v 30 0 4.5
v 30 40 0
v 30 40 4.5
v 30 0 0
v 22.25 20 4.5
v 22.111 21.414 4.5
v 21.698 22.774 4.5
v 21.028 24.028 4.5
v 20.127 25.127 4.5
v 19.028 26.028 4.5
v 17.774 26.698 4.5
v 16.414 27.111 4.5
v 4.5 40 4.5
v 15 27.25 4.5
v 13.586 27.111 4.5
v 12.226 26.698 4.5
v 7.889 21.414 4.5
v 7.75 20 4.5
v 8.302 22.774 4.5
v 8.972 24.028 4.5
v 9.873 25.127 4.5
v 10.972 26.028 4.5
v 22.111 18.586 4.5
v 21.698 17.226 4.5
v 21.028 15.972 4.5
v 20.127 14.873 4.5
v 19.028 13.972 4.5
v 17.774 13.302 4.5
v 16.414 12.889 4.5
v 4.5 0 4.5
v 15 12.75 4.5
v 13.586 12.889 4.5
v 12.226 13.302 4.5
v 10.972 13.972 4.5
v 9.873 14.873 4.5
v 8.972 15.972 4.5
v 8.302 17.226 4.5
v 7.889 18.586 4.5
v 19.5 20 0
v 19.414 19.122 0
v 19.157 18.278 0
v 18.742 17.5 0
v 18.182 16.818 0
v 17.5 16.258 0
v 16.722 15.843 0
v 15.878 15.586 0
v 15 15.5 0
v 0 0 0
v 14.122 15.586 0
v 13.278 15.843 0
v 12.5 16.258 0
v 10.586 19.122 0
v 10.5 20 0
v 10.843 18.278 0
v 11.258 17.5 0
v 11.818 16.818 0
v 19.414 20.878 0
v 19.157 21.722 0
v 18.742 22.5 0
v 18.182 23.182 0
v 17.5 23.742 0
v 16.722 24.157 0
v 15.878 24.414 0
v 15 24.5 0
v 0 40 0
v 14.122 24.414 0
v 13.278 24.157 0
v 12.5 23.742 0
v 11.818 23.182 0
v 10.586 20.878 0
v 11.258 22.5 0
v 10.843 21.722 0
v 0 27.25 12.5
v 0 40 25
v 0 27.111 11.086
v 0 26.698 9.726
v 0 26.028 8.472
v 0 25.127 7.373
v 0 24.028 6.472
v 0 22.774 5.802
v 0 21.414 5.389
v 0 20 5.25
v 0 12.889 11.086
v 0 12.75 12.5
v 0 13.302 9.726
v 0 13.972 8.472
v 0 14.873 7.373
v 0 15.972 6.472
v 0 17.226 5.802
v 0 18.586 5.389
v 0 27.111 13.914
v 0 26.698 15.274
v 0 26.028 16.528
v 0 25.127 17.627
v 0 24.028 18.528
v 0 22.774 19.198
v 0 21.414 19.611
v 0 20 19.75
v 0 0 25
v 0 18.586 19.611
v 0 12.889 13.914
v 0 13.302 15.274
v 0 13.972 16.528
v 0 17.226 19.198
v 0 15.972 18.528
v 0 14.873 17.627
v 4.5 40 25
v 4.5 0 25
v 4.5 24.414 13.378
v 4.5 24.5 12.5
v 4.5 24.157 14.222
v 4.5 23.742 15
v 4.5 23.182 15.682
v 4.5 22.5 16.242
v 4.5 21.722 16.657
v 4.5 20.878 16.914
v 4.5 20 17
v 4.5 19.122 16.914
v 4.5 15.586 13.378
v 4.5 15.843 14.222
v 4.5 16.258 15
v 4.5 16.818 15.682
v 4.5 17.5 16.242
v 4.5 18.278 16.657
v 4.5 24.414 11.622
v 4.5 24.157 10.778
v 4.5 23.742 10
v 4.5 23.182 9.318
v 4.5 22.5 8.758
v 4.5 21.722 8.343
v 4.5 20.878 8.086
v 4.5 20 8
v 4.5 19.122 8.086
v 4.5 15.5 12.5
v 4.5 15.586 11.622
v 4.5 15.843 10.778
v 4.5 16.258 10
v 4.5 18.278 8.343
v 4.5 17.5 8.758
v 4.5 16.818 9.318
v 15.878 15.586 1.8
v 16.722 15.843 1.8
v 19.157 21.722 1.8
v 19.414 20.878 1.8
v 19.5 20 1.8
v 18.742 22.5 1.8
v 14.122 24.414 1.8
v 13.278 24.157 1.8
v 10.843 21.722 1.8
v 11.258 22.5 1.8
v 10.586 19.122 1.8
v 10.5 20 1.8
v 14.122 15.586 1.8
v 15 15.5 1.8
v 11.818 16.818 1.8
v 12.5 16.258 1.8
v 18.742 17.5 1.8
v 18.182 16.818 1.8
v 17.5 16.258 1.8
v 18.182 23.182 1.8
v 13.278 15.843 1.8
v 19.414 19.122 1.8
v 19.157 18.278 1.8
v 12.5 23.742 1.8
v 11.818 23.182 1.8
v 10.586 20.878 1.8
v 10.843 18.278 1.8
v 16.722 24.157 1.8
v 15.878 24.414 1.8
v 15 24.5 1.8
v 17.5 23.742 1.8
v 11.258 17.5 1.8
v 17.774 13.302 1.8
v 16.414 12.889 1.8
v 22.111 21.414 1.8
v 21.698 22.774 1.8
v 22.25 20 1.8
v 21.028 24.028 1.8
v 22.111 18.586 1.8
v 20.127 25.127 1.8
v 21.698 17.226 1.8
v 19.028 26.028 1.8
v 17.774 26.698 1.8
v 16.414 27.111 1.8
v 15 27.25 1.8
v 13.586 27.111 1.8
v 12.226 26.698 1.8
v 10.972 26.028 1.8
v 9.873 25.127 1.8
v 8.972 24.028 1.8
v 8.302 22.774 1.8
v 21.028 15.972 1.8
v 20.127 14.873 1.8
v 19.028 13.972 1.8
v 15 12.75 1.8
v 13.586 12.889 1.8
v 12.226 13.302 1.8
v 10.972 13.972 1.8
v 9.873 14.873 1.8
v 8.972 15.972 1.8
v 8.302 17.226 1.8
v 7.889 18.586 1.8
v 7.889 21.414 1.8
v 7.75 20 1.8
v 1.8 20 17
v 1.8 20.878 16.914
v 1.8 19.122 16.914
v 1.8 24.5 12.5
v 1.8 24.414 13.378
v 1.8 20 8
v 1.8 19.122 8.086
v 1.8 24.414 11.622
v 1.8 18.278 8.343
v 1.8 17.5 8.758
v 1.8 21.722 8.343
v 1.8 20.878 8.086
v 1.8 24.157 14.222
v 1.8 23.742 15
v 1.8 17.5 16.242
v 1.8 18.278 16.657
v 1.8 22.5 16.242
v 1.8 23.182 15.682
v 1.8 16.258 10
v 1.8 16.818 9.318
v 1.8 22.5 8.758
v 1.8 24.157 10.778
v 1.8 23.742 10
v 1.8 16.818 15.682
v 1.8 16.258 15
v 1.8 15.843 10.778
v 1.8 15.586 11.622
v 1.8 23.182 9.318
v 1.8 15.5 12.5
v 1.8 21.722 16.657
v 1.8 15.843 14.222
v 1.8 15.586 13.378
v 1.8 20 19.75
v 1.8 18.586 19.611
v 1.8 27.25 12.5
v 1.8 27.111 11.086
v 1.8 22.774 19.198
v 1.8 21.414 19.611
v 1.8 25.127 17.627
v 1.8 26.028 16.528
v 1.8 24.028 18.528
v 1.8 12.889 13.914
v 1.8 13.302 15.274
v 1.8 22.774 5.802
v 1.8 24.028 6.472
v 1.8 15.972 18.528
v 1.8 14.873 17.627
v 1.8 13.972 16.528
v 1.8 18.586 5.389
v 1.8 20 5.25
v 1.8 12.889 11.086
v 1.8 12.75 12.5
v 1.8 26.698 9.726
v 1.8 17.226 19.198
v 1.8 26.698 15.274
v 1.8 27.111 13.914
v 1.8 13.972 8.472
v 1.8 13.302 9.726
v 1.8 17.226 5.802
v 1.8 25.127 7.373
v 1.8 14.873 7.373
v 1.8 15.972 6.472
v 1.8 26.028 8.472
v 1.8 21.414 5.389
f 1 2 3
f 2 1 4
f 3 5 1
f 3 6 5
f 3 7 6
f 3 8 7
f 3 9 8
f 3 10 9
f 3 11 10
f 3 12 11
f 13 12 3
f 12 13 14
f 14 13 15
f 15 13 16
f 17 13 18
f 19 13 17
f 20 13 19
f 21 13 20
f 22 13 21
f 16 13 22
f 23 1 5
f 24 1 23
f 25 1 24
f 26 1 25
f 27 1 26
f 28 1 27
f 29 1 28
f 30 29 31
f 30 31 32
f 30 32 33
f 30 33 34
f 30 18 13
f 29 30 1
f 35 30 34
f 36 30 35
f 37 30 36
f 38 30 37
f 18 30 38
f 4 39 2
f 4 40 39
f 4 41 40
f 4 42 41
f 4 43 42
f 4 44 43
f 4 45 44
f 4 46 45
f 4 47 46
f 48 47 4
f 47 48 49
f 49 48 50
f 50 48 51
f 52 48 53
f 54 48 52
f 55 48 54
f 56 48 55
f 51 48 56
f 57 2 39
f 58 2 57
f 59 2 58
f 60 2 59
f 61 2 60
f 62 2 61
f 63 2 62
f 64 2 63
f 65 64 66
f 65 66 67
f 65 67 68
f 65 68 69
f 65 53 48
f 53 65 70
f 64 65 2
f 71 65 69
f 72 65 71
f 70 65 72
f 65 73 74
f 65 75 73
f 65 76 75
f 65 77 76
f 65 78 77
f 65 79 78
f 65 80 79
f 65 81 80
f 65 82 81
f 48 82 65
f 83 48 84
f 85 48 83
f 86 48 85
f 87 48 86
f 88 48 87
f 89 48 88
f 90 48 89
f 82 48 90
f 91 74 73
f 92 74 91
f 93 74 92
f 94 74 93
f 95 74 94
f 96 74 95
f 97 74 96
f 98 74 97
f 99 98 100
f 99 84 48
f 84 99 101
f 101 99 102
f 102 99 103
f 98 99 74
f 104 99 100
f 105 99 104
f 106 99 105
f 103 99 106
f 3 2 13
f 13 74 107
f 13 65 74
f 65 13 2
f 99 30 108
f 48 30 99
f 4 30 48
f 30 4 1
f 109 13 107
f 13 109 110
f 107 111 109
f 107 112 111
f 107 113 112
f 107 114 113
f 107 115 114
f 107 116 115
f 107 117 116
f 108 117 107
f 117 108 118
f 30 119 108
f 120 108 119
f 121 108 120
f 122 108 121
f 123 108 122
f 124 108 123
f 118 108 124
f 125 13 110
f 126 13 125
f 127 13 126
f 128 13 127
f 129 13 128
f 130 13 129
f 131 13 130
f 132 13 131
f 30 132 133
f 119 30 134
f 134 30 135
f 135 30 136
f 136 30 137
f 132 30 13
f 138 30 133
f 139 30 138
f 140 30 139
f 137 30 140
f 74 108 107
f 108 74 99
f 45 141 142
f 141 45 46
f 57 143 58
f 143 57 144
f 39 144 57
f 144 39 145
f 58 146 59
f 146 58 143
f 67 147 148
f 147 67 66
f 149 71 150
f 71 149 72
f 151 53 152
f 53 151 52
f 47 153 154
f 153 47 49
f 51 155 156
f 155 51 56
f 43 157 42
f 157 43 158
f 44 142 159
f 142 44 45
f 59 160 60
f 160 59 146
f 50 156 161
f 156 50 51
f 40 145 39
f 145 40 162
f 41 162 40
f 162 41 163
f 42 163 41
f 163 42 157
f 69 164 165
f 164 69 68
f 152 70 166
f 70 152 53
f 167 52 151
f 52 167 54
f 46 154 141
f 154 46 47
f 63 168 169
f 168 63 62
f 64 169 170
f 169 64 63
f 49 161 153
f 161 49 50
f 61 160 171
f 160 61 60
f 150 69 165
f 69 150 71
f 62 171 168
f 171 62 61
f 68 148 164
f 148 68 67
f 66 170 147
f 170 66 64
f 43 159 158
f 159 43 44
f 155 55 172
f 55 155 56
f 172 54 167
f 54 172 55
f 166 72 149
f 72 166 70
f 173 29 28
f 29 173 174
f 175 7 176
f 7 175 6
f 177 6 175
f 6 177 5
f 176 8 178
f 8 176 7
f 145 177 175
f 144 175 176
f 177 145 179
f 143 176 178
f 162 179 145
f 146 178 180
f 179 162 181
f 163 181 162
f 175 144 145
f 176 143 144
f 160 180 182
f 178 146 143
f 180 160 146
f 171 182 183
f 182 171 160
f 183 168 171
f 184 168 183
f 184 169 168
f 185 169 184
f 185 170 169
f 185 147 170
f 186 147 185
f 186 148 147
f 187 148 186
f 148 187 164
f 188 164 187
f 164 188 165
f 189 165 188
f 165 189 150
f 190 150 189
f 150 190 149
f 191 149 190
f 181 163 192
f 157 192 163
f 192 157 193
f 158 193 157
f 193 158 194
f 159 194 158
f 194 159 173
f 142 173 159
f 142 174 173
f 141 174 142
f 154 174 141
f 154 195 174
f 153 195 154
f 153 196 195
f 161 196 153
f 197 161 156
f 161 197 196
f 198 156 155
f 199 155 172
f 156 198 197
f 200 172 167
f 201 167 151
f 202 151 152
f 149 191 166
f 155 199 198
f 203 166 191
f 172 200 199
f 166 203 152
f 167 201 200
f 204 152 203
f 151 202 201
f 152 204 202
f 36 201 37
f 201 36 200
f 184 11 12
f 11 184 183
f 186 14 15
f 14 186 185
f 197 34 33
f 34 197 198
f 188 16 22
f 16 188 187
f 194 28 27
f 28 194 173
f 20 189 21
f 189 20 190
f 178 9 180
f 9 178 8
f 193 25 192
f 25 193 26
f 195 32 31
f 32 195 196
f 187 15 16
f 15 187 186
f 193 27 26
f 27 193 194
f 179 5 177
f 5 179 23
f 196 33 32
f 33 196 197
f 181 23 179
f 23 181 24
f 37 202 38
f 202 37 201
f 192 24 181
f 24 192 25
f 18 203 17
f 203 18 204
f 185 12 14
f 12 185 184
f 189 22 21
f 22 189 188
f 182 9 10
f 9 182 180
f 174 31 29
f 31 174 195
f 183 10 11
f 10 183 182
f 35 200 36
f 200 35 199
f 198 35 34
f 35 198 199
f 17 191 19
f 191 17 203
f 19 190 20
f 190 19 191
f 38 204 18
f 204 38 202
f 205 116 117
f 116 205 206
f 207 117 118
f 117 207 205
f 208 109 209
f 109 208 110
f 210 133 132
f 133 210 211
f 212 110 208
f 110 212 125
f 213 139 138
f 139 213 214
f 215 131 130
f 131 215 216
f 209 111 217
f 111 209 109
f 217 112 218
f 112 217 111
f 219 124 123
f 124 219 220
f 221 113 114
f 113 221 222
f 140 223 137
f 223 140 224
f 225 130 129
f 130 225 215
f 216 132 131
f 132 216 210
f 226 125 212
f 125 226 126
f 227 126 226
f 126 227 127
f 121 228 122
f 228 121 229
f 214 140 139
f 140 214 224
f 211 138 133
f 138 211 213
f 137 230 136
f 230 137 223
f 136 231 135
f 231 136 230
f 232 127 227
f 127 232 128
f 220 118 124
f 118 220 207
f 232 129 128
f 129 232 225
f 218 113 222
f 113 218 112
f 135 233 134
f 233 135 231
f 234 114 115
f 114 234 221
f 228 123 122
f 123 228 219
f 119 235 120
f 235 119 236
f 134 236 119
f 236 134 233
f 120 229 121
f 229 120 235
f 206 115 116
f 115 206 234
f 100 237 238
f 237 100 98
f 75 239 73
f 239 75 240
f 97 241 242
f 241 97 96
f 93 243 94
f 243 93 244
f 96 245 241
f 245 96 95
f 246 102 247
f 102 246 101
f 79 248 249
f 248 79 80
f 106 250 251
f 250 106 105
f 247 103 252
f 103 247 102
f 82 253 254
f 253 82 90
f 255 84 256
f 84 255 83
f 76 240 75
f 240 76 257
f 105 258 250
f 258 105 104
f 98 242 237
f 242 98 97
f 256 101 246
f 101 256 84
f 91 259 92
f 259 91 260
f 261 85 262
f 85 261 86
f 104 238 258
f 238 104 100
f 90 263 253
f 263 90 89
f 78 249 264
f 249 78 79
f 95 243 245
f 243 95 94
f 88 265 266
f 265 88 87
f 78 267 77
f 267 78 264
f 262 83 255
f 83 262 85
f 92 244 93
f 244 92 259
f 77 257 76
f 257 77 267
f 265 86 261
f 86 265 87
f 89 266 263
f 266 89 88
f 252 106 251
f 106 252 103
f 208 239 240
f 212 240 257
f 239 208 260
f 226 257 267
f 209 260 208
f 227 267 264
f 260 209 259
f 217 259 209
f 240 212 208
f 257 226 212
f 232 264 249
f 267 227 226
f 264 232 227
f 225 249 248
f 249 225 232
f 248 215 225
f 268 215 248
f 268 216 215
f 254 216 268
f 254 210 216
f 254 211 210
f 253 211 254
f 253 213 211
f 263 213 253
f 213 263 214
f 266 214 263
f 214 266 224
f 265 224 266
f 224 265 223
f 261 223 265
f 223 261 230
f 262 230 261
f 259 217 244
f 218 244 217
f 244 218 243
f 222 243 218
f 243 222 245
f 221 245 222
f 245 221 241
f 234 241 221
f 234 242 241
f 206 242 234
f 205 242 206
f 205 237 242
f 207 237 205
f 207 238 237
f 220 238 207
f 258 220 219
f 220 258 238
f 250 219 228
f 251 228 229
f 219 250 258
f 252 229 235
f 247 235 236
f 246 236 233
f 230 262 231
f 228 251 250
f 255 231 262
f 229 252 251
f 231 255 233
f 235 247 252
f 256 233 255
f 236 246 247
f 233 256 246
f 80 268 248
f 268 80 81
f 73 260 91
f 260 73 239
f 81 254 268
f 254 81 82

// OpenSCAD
$fn = 32;

// ----------------------------------------------------------------------
// L-bracket: 30 x 40 x 25 mm
// ----------------------------------------------------------------------

// --- parameters (mm) ---
arm_x = 30;               // horizontal leg, X
arm_z = 25;               // vertical leg, Z
width = 40;               // bracket depth, Y
wall = 4.5;               // plate thickness
hole_d = 9;               // clearance for M8
cb_d = 14.5;              // counterbore seat
cb_h = 2.7;               // counterbore depth

module hole_z(px, py) {
  translate([px, py, -2.5]) cylinder(h = wall + 5, d = hole_d);
}
module hole_x(pz, py) {
  translate([-2.5, py, pz]) rotate([0, 90, 0]) cylinder(h = wall + 5, d = hole_d);
}
module cb_z(px, py) {
  translate([px, py, wall - cb_h]) cylinder(h = cb_h + 0.4, d = cb_d);
}
module cb_x(pz, py) {
  translate([wall - cb_h, py, pz]) rotate([0, -90, 0]) cylinder(h = cb_h + 0.4, d = cb_d);
}

difference() {
  union() {
    /* horizontal leg */
    cube([arm_x, width, wall]);
    /* vertical leg, overlapping the corner block */
    cube([wall, width, arm_z]);
  }
  hole_z(15, 20);
  cb_z(15, 20);
  hole_x(12.5, 20);
  cb_x(12.5, 20);
}
